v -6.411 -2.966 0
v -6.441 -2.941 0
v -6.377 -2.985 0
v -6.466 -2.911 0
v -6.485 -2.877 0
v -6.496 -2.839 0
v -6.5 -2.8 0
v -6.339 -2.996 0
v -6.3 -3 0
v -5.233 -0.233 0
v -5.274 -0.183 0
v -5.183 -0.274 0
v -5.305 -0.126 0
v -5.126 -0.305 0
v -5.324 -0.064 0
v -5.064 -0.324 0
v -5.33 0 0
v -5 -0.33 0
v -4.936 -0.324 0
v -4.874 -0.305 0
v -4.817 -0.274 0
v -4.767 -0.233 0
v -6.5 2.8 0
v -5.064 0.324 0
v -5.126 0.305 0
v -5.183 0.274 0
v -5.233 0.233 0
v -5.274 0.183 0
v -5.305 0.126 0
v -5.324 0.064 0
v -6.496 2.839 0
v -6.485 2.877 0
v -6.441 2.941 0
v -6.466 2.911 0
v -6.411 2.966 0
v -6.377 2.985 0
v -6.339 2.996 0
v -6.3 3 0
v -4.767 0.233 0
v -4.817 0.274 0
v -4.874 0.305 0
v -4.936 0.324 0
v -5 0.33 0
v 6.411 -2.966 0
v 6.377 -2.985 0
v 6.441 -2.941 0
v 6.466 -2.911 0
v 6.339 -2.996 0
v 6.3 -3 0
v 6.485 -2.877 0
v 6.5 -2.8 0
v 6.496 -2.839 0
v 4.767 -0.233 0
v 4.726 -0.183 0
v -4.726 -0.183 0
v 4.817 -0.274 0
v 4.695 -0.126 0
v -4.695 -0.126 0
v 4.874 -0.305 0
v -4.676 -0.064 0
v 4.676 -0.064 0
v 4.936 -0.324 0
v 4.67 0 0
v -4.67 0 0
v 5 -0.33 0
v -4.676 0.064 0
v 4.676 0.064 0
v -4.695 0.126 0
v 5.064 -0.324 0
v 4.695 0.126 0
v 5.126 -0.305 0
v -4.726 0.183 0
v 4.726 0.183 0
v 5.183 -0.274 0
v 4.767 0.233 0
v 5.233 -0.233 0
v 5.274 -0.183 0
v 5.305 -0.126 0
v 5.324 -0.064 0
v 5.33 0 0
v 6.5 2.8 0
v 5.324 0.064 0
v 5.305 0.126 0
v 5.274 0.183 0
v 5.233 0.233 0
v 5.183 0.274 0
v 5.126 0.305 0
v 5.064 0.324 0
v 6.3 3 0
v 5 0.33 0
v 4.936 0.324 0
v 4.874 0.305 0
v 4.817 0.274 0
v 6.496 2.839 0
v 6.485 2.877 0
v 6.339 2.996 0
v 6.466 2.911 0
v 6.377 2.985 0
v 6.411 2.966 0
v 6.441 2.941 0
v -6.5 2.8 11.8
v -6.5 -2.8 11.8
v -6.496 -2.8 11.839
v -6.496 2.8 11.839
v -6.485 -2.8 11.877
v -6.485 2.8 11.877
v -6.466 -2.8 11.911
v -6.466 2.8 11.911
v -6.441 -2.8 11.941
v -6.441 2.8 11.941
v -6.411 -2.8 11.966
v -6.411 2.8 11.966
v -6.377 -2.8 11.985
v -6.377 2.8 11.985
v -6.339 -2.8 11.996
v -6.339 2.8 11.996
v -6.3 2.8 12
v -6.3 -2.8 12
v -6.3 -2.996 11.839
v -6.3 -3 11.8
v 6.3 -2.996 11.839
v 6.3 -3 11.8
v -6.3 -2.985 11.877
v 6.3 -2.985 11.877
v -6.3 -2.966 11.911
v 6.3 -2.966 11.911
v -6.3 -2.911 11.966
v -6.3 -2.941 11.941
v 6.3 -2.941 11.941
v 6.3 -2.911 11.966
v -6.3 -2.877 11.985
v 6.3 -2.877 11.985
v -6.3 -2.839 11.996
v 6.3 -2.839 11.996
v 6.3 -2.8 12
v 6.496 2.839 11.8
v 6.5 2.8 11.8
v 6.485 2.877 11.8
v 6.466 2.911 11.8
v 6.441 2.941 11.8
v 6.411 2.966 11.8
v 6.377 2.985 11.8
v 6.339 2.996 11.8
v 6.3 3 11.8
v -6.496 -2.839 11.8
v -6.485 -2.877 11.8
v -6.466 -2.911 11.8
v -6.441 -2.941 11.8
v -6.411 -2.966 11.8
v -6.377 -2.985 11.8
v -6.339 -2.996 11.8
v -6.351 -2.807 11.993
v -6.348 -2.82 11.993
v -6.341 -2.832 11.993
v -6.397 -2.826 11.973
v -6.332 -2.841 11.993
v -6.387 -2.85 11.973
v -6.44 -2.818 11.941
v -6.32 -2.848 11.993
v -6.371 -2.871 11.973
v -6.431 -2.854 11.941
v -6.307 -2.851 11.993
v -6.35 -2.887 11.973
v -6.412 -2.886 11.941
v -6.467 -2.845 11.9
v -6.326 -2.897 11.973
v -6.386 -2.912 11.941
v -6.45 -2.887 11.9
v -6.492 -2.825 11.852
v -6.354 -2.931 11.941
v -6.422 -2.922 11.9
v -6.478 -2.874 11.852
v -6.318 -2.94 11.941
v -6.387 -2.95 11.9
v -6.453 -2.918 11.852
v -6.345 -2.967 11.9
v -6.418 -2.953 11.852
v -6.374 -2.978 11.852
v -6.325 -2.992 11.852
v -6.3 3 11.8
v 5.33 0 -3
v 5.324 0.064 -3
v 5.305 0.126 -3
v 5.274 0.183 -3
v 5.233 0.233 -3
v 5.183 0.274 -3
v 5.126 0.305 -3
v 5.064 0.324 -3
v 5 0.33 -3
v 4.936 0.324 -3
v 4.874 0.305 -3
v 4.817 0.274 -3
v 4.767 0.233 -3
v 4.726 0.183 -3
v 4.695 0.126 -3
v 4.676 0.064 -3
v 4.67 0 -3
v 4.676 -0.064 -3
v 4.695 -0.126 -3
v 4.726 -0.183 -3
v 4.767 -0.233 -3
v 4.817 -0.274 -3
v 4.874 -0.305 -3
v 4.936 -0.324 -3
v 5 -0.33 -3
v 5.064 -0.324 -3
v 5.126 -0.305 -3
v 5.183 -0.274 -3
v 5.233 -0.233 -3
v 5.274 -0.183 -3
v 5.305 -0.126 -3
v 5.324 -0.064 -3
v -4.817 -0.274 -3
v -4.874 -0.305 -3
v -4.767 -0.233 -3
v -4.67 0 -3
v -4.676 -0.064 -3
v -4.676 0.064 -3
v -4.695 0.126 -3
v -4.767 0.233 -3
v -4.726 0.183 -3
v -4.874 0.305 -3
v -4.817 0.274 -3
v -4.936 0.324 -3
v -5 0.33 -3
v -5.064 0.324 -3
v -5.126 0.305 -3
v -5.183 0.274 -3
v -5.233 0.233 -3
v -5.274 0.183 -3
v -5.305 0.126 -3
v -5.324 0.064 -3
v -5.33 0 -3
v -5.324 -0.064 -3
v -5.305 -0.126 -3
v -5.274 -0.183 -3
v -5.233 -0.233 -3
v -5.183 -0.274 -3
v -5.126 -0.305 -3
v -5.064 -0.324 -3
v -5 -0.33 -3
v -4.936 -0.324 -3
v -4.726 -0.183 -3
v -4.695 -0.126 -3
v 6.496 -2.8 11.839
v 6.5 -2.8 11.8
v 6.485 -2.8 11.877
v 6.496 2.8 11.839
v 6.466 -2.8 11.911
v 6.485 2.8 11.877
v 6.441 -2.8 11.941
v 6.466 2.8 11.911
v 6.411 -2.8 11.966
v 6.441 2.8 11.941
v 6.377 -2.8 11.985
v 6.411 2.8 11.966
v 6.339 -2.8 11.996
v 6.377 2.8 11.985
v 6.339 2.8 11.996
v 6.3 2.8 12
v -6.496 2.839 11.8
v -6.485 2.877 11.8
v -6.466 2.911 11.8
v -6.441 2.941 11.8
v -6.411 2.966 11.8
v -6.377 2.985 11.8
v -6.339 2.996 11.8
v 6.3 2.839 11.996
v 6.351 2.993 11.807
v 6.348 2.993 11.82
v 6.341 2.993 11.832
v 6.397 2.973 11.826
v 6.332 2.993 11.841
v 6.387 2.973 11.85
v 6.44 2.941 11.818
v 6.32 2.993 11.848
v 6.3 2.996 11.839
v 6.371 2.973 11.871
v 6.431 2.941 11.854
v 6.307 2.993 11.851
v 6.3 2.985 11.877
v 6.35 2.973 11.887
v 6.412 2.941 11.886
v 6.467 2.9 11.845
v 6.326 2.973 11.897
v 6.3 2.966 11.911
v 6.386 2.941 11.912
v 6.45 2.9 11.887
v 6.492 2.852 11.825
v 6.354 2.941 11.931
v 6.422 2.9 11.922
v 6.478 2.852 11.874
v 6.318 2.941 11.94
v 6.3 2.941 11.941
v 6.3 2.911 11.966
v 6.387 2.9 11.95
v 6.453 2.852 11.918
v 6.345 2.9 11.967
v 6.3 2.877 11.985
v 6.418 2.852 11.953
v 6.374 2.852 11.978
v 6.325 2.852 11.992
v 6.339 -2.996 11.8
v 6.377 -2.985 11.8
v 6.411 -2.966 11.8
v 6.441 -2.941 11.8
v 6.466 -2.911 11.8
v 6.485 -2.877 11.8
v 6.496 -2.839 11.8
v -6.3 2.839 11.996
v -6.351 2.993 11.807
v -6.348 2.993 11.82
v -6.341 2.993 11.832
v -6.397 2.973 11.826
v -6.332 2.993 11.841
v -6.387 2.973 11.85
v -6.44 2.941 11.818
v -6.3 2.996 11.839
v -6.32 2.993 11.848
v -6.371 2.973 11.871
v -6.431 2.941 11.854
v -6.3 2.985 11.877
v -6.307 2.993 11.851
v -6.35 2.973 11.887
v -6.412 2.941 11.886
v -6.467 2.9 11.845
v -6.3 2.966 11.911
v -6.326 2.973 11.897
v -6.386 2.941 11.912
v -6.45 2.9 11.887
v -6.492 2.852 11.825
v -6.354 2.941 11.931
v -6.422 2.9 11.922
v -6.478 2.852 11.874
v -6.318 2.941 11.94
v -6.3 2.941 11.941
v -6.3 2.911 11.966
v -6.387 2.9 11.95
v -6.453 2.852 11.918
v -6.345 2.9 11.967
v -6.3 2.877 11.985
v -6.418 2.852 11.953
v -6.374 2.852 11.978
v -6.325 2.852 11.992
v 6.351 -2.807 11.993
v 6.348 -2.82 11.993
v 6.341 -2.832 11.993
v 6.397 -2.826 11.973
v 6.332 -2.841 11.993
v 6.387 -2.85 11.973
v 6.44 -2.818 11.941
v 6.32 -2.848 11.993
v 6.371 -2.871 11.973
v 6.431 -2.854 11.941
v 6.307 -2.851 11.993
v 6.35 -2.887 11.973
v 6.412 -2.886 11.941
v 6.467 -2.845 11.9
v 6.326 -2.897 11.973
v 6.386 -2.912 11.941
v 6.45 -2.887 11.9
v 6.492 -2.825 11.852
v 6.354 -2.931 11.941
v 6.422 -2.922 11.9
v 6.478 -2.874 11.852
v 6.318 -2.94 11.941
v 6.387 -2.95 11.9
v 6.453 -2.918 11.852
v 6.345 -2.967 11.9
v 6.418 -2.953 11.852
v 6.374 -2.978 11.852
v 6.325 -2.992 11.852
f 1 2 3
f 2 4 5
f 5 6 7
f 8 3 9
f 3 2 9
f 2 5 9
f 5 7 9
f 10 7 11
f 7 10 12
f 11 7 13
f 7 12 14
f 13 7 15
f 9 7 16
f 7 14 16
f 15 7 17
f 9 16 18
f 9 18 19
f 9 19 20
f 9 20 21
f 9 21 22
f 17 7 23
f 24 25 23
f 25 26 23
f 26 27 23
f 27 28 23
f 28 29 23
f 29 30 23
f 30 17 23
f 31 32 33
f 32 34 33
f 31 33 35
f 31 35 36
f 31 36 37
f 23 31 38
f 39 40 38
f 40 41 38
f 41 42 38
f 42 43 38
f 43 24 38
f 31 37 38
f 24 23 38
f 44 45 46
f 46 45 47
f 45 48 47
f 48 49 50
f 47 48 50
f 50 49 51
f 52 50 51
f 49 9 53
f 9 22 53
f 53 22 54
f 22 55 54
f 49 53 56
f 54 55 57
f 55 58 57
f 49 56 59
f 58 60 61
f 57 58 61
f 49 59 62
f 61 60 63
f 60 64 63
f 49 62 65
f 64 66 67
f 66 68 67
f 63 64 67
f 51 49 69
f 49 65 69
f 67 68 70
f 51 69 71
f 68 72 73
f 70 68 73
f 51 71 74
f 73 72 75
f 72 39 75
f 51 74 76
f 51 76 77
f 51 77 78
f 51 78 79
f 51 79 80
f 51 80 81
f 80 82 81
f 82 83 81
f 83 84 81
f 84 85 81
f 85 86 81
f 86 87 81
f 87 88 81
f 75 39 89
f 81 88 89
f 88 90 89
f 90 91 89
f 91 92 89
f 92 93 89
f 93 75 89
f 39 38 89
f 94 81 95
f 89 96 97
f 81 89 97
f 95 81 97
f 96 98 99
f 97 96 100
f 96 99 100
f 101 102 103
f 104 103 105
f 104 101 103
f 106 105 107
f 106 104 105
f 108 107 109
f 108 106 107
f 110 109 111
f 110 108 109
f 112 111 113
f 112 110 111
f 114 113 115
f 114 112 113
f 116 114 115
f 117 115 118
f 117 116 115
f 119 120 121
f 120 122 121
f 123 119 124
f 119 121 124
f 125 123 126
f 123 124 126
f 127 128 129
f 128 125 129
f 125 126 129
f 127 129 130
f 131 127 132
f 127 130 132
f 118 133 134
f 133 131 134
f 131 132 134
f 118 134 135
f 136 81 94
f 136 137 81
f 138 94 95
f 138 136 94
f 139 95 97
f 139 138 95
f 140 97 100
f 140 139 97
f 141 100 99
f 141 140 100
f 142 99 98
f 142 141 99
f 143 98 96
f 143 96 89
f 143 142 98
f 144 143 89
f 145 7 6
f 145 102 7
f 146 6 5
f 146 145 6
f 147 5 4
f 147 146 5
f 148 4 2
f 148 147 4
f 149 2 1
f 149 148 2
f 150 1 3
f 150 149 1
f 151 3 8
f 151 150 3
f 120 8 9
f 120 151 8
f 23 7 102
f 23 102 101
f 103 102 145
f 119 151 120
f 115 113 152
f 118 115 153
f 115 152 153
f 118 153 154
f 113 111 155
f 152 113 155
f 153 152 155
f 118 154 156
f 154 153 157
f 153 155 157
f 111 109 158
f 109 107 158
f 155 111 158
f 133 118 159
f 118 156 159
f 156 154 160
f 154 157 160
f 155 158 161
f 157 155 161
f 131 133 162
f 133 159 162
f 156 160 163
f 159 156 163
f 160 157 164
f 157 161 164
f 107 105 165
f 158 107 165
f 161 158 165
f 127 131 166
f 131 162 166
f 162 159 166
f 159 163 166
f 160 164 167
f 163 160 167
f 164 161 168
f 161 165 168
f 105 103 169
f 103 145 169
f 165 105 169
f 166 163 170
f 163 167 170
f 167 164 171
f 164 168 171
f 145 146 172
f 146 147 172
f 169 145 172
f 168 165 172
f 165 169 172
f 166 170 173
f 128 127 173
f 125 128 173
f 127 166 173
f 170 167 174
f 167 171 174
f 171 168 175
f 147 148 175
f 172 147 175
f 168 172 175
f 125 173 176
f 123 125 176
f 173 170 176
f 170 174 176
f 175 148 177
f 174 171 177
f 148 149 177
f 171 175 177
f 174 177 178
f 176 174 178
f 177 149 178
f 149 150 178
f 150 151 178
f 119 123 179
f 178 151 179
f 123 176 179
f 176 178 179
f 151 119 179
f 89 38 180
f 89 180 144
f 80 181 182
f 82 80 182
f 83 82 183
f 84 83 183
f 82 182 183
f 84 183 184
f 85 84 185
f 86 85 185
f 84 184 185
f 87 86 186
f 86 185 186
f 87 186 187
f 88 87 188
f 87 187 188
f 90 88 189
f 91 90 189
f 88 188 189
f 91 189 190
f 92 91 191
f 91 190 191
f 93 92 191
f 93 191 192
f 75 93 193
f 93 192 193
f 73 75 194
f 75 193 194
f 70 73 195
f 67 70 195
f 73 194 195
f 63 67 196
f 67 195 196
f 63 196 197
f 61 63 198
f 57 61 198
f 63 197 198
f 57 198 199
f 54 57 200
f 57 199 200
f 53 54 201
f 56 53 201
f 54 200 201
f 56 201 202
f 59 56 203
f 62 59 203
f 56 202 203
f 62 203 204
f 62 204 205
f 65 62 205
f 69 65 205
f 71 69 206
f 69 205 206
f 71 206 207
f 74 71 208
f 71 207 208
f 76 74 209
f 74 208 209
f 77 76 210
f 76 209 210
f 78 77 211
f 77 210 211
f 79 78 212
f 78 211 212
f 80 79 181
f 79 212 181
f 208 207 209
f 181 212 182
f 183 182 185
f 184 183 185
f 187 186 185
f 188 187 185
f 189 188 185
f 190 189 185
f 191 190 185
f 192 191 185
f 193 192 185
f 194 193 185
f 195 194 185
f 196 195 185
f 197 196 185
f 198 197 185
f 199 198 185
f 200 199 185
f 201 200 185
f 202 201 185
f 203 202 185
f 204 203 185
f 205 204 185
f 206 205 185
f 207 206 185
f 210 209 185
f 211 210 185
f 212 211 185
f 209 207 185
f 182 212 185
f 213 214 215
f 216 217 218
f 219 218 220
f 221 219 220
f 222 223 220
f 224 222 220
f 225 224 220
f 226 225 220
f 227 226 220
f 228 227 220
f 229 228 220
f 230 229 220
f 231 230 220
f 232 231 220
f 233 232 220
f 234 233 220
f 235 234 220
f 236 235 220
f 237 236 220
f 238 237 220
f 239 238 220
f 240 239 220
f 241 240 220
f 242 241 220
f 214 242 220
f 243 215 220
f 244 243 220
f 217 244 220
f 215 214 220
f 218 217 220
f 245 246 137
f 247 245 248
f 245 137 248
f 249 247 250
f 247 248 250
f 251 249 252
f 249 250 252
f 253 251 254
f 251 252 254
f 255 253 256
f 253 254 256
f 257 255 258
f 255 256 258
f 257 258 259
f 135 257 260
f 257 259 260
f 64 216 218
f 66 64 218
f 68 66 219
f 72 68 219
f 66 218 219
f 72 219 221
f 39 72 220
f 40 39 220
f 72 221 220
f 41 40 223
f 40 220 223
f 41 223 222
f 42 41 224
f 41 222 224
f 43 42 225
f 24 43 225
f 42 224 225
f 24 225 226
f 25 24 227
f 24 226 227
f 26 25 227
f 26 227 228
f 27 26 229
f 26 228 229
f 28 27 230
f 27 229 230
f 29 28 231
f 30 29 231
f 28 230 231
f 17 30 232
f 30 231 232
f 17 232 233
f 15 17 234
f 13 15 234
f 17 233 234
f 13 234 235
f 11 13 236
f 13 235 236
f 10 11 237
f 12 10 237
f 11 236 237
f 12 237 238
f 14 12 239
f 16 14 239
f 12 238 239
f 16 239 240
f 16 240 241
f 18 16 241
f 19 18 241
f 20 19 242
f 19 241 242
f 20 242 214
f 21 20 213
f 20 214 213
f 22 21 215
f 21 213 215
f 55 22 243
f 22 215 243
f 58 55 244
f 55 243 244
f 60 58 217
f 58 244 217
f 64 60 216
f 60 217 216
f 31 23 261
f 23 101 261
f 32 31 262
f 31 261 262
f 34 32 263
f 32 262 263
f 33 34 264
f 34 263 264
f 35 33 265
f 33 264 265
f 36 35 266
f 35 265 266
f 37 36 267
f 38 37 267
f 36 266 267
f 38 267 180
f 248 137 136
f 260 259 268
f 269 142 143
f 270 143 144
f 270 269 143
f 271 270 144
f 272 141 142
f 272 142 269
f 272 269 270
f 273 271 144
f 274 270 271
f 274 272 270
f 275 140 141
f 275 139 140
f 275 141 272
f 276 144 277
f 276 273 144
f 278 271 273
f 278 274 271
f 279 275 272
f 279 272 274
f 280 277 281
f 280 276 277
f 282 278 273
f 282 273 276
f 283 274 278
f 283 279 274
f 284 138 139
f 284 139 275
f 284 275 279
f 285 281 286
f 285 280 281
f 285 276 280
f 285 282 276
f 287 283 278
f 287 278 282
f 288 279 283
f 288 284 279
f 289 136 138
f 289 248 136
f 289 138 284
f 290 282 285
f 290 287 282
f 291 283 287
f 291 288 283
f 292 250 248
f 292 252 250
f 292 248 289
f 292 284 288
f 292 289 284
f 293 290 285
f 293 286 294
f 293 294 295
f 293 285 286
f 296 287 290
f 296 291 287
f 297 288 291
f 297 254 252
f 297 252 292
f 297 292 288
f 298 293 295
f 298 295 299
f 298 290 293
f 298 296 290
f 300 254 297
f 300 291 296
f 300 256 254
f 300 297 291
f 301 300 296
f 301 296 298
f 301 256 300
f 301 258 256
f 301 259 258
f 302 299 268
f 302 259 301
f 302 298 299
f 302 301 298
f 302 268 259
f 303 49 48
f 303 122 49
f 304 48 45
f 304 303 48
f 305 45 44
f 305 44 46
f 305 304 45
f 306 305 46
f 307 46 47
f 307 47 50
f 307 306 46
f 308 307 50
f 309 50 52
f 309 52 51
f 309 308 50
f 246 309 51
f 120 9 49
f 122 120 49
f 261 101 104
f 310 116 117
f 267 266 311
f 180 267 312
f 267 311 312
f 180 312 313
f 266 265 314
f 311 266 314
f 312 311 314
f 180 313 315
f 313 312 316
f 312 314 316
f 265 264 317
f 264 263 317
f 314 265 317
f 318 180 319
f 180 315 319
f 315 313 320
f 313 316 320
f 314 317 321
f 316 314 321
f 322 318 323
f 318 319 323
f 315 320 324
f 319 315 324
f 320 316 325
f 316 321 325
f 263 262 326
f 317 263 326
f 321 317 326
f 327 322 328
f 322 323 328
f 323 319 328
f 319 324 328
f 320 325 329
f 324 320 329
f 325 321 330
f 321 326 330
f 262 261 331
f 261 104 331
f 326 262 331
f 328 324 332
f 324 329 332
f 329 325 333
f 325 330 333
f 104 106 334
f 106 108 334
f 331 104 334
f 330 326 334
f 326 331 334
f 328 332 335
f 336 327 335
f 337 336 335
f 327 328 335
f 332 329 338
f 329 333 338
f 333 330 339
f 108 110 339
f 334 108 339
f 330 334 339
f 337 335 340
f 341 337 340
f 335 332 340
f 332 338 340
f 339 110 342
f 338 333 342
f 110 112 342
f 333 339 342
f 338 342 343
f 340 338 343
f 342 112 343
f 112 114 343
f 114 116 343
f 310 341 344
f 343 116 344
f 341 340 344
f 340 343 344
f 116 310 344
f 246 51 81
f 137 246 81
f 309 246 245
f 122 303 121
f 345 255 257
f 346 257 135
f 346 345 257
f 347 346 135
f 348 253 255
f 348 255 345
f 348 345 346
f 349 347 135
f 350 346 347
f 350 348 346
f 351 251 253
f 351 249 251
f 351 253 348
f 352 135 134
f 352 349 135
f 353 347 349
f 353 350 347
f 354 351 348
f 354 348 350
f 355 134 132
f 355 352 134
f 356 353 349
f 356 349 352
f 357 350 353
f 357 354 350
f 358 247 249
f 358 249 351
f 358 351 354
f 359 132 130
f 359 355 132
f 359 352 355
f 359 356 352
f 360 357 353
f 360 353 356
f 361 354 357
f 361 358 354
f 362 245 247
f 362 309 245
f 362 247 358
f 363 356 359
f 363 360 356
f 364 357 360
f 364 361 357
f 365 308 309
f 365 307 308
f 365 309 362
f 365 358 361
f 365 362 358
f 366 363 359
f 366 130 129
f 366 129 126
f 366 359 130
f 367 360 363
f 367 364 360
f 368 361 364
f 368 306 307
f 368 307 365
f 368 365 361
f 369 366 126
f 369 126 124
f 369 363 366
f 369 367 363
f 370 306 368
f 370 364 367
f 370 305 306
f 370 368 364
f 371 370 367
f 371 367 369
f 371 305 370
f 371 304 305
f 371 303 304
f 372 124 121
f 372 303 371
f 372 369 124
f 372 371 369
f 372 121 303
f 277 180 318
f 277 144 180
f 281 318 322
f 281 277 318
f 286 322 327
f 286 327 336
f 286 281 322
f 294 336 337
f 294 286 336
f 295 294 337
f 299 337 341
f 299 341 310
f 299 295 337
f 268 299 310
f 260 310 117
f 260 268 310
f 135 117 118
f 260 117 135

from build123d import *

# Parameters (mm, degrees)
CYLINDER001_R     = 0.33
CYLINDER001_DEPTH = 3
CYLINDER_R        = 0.33
CYLINDER_DEPTH    = 3
BOX_W             = 13
BOX_H             = 6
BOX_DEPTH         = 12
FILLET_R          = 0.2


with BuildPart() as pin2:
    # Cylinder001 → Cylinder001 (new body)
    with BuildSketch(Plane(origin=(5, 0, -3), x_dir=(1, 0, 0), z_dir=(0, 0, 1))):
        Circle(CYLINDER001_R)
    extrude(amount=CYLINDER001_DEPTH)


with BuildPart() as pin1:
    # Cylinder → Cylinder (new body)
    with BuildSketch(Plane(origin=(-5, 0, -3), x_dir=(1, 0, 0), z_dir=(0, 0, 1))):
        Circle(CYLINDER_R)
    extrude(amount=CYLINDER_DEPTH)


with BuildPart() as caparv1000w60l1300t600h1200:
    # Box → Box (new body)
    with BuildSketch(Plane(origin=(-6.5, -3, 0), x_dir=(1, 0, 0), z_dir=(0, 0, 1))):
        with Locations((6.5, 3)):
            Rectangle(BOX_W, BOX_H)
    extrude(amount=BOX_DEPTH)

    # Fillet
    fillet_edges = [caparv1000w60l1300t600h1200.edges().sort_by_distance(p)[0] for p in [
        (-6.5, -3, 6),
        (-6.5, 0, 12),
        (-6.5, 3, 6),
        (6.5, -3, 6),
        (6.5, 0, 12),
        (6.5, 3, 6),
        (0, -3, 12),
        (0, 3, 12),
    ]]
    fillet(fillet_edges, radius=FILLET_R)

    # Fusion: union Pin1
    add(pin1.part)

    # Fusion001: union Pin2
    add(pin2.part)


solid = caparv1000w60l1300t600h1200.part
